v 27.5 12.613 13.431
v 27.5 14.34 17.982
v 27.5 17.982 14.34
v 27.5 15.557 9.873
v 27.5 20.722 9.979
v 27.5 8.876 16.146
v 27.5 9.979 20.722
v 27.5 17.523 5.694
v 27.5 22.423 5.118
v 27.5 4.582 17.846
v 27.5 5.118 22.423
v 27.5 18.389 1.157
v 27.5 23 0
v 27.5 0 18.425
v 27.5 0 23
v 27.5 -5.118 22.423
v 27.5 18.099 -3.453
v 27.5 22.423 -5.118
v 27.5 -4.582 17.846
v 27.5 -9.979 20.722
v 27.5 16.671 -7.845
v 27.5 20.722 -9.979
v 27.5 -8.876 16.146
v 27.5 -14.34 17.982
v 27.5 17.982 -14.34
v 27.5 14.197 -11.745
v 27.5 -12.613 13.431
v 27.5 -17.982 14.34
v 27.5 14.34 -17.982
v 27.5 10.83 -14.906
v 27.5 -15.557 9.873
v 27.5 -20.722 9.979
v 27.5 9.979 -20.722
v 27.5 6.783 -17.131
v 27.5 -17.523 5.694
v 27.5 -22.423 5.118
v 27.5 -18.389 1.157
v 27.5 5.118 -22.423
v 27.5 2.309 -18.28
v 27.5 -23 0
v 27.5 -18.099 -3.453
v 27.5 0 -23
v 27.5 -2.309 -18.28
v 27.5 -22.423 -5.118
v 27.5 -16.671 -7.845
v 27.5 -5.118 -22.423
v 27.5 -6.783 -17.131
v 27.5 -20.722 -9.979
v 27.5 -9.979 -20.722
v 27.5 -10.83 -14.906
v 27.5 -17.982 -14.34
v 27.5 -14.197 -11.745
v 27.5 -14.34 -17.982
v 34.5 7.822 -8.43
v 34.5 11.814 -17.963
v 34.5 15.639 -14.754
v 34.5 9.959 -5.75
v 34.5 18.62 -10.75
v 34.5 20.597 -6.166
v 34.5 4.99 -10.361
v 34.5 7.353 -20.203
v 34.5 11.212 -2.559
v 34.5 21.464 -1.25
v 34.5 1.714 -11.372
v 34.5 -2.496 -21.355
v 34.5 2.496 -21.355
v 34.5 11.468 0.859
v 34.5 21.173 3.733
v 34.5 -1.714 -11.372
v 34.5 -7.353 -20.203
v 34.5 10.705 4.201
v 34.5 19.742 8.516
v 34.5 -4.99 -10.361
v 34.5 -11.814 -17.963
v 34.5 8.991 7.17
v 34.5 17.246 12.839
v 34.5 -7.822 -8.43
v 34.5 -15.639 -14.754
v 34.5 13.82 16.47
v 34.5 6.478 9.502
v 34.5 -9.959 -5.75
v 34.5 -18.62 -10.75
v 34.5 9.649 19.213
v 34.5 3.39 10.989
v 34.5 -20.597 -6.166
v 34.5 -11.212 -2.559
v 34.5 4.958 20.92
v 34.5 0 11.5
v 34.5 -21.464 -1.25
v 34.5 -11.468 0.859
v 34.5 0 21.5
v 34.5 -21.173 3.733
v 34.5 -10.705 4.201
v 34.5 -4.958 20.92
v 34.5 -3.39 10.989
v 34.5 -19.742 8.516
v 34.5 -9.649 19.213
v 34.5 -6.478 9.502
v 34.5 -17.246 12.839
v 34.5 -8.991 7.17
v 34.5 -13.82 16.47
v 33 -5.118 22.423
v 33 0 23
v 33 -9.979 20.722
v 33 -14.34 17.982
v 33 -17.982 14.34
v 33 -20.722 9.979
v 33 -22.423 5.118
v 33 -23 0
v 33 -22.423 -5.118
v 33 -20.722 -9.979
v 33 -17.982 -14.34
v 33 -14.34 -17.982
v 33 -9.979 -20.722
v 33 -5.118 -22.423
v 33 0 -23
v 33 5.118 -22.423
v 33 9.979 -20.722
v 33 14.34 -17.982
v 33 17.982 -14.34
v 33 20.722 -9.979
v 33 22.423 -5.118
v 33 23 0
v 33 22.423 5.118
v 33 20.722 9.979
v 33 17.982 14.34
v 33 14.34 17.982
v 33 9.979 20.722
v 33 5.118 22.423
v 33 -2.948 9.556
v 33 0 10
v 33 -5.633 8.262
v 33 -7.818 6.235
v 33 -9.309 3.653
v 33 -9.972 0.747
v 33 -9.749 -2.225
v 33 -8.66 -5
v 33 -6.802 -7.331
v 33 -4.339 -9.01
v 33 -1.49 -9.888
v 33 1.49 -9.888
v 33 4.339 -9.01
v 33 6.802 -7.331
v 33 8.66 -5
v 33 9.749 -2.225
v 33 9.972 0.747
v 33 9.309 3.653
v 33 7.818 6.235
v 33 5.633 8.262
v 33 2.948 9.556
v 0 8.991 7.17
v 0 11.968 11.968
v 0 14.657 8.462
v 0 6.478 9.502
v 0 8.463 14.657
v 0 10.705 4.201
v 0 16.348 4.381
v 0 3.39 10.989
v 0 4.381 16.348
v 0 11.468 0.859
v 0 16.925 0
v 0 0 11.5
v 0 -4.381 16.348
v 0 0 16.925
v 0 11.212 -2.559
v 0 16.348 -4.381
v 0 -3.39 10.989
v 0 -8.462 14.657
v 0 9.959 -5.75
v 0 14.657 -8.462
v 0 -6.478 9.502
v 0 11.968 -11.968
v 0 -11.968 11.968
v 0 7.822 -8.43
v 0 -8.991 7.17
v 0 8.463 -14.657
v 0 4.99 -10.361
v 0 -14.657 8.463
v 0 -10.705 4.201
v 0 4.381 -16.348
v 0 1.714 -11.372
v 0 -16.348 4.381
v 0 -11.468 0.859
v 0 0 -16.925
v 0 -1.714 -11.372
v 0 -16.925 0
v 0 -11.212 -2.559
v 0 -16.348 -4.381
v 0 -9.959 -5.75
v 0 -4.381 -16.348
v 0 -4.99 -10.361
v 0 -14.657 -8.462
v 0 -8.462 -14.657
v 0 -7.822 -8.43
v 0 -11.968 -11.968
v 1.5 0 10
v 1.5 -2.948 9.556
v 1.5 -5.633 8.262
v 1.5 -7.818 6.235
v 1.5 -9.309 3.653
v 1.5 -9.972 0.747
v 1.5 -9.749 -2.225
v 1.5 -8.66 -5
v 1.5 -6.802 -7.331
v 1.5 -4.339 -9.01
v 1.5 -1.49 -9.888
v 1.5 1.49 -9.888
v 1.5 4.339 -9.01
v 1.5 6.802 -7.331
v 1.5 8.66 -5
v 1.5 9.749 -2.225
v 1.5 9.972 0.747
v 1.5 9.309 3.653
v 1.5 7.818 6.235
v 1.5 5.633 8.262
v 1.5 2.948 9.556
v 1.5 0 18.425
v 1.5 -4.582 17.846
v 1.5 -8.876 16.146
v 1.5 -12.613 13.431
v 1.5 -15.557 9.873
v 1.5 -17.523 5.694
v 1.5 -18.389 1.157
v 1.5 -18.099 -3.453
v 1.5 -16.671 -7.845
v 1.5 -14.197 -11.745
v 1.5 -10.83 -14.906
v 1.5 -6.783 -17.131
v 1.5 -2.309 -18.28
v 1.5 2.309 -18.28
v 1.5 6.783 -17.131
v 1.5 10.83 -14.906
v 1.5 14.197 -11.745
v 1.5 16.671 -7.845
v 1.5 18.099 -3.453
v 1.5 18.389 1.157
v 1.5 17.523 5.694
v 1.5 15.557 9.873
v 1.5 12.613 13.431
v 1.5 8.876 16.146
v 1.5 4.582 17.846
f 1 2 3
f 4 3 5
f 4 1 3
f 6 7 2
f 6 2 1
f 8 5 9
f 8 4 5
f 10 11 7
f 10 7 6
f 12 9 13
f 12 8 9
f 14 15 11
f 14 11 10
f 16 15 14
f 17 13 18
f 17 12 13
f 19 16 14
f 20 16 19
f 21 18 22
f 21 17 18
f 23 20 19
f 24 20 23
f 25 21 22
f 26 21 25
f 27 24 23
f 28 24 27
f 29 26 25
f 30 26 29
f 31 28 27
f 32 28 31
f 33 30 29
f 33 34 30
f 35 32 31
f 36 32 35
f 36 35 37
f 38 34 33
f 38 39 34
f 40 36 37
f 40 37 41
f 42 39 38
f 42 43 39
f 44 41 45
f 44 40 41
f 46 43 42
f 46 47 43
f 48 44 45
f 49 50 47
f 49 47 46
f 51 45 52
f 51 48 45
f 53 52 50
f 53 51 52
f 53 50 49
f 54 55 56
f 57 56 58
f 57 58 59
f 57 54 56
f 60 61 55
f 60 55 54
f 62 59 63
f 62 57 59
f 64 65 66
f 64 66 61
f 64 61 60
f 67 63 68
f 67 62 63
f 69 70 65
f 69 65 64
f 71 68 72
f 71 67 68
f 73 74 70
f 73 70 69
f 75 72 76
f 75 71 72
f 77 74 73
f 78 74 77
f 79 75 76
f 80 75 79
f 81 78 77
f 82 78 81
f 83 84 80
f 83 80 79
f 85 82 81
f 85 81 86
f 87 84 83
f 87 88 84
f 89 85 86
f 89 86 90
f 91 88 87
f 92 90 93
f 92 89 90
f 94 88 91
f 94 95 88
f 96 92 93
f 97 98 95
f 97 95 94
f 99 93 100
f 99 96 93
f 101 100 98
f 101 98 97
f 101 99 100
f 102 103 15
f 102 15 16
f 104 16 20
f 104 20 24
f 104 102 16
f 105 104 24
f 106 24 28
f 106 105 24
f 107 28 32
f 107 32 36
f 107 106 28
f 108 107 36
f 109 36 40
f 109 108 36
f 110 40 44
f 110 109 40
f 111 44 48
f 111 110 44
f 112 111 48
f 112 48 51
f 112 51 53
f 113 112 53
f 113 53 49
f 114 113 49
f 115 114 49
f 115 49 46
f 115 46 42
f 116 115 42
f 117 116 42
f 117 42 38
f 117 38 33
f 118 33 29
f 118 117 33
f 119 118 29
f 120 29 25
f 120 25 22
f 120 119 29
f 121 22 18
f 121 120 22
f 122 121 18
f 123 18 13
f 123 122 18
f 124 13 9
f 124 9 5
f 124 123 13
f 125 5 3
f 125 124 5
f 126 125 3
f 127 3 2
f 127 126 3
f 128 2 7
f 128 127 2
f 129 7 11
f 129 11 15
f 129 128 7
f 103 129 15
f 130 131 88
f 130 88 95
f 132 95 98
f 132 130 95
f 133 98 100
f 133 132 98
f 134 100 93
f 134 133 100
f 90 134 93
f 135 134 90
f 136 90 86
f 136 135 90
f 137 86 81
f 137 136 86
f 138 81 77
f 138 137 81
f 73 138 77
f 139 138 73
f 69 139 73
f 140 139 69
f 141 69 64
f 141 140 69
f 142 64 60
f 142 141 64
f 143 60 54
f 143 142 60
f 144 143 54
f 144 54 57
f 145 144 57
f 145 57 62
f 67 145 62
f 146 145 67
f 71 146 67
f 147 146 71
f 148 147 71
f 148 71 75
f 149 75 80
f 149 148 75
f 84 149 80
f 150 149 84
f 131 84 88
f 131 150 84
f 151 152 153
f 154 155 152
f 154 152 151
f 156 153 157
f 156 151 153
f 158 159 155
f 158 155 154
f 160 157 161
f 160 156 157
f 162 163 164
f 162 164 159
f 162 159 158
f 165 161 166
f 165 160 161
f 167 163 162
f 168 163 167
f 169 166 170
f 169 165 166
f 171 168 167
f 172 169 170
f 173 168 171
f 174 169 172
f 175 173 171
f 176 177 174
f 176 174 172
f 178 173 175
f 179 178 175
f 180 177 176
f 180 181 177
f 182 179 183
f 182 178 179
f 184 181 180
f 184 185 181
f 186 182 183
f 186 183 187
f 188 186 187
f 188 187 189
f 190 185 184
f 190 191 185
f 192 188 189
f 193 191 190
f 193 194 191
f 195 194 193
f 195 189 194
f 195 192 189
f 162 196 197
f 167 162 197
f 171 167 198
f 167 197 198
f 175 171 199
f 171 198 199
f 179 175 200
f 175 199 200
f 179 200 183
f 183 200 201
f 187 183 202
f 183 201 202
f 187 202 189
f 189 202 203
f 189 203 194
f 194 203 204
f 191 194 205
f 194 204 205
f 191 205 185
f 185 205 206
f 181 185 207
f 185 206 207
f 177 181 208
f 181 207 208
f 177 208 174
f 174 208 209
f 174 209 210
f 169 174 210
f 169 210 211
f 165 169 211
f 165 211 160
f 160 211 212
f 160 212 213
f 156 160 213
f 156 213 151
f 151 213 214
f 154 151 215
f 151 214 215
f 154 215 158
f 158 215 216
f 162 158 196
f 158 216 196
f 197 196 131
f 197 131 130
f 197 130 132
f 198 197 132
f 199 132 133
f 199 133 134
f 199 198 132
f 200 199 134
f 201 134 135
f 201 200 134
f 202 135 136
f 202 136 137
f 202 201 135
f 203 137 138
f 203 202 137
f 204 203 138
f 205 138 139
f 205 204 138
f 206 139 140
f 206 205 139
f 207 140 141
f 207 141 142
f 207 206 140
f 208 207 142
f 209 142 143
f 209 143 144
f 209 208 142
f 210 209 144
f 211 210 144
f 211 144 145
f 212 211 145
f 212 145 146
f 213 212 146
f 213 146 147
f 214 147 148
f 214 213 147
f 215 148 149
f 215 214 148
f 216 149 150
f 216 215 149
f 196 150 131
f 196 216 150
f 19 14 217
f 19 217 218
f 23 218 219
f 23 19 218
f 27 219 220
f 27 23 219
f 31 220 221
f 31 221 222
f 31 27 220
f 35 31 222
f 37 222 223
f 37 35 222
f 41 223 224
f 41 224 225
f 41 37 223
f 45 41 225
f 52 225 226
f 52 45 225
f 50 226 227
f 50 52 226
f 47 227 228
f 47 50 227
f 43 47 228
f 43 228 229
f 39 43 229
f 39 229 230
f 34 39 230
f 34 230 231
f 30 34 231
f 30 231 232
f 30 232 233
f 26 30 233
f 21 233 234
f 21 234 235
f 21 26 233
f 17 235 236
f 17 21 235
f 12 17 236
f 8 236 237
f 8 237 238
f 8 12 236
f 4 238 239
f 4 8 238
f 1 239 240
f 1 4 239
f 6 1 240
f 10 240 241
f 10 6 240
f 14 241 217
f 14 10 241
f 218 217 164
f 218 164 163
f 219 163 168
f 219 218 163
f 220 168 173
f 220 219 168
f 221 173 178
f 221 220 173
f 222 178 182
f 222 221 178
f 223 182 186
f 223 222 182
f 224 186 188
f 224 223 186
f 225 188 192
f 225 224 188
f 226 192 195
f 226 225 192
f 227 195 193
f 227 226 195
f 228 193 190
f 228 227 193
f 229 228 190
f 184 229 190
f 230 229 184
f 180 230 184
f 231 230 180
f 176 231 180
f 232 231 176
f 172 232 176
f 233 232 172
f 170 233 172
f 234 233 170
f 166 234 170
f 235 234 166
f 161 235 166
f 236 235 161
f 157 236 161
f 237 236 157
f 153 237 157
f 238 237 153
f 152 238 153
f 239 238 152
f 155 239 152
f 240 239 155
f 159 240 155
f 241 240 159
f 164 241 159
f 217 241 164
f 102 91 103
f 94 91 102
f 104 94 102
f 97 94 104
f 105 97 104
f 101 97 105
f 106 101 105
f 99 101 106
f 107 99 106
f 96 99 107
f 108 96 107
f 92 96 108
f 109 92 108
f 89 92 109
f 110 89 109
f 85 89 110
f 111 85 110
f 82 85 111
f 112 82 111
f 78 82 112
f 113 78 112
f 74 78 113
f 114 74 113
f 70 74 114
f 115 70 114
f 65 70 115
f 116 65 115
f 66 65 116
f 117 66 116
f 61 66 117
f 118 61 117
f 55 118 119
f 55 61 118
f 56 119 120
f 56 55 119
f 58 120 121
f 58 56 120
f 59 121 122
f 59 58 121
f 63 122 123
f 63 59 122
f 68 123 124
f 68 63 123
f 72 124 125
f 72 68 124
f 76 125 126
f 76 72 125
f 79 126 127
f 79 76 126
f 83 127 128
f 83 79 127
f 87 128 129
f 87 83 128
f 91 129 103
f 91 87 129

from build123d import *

# Parameters (mm, degrees)
CHANFREIN1_SIZE = 1.5


with BuildPart() as part:
    # Esquisse1 → Révolution1 (revolve)
    with BuildSketch(Plane.XY, mode=Mode.PRIVATE) as r_volution1_sk:
        Polygon((0, 10), (0, 18.425), (27.5, 18.425), (27.5, 23), (34.5, 23), (34.5, 10), align=None)
    revolve(r_volution1_sk.sketch.rotate(Axis((-4.444335788, 0, 0), (1, 0, 0)), 90), axis=Axis((-4.444335788, 0, 0), (1, 0, 0)))  # turned: the seam where the file's is

    # Chanfrein1
    chanfrein1_edges = [part.edges().sort_by_distance(p)[0] for p in [
        (0, 0, -18.425),
        (0, 0, -10),
        (34.5, 0, -10),
        (34.5, 0, -23),
    ]]
    chamfer(chanfrein1_edges, length=CHANFREIN1_SIZE)


solid = part.part
